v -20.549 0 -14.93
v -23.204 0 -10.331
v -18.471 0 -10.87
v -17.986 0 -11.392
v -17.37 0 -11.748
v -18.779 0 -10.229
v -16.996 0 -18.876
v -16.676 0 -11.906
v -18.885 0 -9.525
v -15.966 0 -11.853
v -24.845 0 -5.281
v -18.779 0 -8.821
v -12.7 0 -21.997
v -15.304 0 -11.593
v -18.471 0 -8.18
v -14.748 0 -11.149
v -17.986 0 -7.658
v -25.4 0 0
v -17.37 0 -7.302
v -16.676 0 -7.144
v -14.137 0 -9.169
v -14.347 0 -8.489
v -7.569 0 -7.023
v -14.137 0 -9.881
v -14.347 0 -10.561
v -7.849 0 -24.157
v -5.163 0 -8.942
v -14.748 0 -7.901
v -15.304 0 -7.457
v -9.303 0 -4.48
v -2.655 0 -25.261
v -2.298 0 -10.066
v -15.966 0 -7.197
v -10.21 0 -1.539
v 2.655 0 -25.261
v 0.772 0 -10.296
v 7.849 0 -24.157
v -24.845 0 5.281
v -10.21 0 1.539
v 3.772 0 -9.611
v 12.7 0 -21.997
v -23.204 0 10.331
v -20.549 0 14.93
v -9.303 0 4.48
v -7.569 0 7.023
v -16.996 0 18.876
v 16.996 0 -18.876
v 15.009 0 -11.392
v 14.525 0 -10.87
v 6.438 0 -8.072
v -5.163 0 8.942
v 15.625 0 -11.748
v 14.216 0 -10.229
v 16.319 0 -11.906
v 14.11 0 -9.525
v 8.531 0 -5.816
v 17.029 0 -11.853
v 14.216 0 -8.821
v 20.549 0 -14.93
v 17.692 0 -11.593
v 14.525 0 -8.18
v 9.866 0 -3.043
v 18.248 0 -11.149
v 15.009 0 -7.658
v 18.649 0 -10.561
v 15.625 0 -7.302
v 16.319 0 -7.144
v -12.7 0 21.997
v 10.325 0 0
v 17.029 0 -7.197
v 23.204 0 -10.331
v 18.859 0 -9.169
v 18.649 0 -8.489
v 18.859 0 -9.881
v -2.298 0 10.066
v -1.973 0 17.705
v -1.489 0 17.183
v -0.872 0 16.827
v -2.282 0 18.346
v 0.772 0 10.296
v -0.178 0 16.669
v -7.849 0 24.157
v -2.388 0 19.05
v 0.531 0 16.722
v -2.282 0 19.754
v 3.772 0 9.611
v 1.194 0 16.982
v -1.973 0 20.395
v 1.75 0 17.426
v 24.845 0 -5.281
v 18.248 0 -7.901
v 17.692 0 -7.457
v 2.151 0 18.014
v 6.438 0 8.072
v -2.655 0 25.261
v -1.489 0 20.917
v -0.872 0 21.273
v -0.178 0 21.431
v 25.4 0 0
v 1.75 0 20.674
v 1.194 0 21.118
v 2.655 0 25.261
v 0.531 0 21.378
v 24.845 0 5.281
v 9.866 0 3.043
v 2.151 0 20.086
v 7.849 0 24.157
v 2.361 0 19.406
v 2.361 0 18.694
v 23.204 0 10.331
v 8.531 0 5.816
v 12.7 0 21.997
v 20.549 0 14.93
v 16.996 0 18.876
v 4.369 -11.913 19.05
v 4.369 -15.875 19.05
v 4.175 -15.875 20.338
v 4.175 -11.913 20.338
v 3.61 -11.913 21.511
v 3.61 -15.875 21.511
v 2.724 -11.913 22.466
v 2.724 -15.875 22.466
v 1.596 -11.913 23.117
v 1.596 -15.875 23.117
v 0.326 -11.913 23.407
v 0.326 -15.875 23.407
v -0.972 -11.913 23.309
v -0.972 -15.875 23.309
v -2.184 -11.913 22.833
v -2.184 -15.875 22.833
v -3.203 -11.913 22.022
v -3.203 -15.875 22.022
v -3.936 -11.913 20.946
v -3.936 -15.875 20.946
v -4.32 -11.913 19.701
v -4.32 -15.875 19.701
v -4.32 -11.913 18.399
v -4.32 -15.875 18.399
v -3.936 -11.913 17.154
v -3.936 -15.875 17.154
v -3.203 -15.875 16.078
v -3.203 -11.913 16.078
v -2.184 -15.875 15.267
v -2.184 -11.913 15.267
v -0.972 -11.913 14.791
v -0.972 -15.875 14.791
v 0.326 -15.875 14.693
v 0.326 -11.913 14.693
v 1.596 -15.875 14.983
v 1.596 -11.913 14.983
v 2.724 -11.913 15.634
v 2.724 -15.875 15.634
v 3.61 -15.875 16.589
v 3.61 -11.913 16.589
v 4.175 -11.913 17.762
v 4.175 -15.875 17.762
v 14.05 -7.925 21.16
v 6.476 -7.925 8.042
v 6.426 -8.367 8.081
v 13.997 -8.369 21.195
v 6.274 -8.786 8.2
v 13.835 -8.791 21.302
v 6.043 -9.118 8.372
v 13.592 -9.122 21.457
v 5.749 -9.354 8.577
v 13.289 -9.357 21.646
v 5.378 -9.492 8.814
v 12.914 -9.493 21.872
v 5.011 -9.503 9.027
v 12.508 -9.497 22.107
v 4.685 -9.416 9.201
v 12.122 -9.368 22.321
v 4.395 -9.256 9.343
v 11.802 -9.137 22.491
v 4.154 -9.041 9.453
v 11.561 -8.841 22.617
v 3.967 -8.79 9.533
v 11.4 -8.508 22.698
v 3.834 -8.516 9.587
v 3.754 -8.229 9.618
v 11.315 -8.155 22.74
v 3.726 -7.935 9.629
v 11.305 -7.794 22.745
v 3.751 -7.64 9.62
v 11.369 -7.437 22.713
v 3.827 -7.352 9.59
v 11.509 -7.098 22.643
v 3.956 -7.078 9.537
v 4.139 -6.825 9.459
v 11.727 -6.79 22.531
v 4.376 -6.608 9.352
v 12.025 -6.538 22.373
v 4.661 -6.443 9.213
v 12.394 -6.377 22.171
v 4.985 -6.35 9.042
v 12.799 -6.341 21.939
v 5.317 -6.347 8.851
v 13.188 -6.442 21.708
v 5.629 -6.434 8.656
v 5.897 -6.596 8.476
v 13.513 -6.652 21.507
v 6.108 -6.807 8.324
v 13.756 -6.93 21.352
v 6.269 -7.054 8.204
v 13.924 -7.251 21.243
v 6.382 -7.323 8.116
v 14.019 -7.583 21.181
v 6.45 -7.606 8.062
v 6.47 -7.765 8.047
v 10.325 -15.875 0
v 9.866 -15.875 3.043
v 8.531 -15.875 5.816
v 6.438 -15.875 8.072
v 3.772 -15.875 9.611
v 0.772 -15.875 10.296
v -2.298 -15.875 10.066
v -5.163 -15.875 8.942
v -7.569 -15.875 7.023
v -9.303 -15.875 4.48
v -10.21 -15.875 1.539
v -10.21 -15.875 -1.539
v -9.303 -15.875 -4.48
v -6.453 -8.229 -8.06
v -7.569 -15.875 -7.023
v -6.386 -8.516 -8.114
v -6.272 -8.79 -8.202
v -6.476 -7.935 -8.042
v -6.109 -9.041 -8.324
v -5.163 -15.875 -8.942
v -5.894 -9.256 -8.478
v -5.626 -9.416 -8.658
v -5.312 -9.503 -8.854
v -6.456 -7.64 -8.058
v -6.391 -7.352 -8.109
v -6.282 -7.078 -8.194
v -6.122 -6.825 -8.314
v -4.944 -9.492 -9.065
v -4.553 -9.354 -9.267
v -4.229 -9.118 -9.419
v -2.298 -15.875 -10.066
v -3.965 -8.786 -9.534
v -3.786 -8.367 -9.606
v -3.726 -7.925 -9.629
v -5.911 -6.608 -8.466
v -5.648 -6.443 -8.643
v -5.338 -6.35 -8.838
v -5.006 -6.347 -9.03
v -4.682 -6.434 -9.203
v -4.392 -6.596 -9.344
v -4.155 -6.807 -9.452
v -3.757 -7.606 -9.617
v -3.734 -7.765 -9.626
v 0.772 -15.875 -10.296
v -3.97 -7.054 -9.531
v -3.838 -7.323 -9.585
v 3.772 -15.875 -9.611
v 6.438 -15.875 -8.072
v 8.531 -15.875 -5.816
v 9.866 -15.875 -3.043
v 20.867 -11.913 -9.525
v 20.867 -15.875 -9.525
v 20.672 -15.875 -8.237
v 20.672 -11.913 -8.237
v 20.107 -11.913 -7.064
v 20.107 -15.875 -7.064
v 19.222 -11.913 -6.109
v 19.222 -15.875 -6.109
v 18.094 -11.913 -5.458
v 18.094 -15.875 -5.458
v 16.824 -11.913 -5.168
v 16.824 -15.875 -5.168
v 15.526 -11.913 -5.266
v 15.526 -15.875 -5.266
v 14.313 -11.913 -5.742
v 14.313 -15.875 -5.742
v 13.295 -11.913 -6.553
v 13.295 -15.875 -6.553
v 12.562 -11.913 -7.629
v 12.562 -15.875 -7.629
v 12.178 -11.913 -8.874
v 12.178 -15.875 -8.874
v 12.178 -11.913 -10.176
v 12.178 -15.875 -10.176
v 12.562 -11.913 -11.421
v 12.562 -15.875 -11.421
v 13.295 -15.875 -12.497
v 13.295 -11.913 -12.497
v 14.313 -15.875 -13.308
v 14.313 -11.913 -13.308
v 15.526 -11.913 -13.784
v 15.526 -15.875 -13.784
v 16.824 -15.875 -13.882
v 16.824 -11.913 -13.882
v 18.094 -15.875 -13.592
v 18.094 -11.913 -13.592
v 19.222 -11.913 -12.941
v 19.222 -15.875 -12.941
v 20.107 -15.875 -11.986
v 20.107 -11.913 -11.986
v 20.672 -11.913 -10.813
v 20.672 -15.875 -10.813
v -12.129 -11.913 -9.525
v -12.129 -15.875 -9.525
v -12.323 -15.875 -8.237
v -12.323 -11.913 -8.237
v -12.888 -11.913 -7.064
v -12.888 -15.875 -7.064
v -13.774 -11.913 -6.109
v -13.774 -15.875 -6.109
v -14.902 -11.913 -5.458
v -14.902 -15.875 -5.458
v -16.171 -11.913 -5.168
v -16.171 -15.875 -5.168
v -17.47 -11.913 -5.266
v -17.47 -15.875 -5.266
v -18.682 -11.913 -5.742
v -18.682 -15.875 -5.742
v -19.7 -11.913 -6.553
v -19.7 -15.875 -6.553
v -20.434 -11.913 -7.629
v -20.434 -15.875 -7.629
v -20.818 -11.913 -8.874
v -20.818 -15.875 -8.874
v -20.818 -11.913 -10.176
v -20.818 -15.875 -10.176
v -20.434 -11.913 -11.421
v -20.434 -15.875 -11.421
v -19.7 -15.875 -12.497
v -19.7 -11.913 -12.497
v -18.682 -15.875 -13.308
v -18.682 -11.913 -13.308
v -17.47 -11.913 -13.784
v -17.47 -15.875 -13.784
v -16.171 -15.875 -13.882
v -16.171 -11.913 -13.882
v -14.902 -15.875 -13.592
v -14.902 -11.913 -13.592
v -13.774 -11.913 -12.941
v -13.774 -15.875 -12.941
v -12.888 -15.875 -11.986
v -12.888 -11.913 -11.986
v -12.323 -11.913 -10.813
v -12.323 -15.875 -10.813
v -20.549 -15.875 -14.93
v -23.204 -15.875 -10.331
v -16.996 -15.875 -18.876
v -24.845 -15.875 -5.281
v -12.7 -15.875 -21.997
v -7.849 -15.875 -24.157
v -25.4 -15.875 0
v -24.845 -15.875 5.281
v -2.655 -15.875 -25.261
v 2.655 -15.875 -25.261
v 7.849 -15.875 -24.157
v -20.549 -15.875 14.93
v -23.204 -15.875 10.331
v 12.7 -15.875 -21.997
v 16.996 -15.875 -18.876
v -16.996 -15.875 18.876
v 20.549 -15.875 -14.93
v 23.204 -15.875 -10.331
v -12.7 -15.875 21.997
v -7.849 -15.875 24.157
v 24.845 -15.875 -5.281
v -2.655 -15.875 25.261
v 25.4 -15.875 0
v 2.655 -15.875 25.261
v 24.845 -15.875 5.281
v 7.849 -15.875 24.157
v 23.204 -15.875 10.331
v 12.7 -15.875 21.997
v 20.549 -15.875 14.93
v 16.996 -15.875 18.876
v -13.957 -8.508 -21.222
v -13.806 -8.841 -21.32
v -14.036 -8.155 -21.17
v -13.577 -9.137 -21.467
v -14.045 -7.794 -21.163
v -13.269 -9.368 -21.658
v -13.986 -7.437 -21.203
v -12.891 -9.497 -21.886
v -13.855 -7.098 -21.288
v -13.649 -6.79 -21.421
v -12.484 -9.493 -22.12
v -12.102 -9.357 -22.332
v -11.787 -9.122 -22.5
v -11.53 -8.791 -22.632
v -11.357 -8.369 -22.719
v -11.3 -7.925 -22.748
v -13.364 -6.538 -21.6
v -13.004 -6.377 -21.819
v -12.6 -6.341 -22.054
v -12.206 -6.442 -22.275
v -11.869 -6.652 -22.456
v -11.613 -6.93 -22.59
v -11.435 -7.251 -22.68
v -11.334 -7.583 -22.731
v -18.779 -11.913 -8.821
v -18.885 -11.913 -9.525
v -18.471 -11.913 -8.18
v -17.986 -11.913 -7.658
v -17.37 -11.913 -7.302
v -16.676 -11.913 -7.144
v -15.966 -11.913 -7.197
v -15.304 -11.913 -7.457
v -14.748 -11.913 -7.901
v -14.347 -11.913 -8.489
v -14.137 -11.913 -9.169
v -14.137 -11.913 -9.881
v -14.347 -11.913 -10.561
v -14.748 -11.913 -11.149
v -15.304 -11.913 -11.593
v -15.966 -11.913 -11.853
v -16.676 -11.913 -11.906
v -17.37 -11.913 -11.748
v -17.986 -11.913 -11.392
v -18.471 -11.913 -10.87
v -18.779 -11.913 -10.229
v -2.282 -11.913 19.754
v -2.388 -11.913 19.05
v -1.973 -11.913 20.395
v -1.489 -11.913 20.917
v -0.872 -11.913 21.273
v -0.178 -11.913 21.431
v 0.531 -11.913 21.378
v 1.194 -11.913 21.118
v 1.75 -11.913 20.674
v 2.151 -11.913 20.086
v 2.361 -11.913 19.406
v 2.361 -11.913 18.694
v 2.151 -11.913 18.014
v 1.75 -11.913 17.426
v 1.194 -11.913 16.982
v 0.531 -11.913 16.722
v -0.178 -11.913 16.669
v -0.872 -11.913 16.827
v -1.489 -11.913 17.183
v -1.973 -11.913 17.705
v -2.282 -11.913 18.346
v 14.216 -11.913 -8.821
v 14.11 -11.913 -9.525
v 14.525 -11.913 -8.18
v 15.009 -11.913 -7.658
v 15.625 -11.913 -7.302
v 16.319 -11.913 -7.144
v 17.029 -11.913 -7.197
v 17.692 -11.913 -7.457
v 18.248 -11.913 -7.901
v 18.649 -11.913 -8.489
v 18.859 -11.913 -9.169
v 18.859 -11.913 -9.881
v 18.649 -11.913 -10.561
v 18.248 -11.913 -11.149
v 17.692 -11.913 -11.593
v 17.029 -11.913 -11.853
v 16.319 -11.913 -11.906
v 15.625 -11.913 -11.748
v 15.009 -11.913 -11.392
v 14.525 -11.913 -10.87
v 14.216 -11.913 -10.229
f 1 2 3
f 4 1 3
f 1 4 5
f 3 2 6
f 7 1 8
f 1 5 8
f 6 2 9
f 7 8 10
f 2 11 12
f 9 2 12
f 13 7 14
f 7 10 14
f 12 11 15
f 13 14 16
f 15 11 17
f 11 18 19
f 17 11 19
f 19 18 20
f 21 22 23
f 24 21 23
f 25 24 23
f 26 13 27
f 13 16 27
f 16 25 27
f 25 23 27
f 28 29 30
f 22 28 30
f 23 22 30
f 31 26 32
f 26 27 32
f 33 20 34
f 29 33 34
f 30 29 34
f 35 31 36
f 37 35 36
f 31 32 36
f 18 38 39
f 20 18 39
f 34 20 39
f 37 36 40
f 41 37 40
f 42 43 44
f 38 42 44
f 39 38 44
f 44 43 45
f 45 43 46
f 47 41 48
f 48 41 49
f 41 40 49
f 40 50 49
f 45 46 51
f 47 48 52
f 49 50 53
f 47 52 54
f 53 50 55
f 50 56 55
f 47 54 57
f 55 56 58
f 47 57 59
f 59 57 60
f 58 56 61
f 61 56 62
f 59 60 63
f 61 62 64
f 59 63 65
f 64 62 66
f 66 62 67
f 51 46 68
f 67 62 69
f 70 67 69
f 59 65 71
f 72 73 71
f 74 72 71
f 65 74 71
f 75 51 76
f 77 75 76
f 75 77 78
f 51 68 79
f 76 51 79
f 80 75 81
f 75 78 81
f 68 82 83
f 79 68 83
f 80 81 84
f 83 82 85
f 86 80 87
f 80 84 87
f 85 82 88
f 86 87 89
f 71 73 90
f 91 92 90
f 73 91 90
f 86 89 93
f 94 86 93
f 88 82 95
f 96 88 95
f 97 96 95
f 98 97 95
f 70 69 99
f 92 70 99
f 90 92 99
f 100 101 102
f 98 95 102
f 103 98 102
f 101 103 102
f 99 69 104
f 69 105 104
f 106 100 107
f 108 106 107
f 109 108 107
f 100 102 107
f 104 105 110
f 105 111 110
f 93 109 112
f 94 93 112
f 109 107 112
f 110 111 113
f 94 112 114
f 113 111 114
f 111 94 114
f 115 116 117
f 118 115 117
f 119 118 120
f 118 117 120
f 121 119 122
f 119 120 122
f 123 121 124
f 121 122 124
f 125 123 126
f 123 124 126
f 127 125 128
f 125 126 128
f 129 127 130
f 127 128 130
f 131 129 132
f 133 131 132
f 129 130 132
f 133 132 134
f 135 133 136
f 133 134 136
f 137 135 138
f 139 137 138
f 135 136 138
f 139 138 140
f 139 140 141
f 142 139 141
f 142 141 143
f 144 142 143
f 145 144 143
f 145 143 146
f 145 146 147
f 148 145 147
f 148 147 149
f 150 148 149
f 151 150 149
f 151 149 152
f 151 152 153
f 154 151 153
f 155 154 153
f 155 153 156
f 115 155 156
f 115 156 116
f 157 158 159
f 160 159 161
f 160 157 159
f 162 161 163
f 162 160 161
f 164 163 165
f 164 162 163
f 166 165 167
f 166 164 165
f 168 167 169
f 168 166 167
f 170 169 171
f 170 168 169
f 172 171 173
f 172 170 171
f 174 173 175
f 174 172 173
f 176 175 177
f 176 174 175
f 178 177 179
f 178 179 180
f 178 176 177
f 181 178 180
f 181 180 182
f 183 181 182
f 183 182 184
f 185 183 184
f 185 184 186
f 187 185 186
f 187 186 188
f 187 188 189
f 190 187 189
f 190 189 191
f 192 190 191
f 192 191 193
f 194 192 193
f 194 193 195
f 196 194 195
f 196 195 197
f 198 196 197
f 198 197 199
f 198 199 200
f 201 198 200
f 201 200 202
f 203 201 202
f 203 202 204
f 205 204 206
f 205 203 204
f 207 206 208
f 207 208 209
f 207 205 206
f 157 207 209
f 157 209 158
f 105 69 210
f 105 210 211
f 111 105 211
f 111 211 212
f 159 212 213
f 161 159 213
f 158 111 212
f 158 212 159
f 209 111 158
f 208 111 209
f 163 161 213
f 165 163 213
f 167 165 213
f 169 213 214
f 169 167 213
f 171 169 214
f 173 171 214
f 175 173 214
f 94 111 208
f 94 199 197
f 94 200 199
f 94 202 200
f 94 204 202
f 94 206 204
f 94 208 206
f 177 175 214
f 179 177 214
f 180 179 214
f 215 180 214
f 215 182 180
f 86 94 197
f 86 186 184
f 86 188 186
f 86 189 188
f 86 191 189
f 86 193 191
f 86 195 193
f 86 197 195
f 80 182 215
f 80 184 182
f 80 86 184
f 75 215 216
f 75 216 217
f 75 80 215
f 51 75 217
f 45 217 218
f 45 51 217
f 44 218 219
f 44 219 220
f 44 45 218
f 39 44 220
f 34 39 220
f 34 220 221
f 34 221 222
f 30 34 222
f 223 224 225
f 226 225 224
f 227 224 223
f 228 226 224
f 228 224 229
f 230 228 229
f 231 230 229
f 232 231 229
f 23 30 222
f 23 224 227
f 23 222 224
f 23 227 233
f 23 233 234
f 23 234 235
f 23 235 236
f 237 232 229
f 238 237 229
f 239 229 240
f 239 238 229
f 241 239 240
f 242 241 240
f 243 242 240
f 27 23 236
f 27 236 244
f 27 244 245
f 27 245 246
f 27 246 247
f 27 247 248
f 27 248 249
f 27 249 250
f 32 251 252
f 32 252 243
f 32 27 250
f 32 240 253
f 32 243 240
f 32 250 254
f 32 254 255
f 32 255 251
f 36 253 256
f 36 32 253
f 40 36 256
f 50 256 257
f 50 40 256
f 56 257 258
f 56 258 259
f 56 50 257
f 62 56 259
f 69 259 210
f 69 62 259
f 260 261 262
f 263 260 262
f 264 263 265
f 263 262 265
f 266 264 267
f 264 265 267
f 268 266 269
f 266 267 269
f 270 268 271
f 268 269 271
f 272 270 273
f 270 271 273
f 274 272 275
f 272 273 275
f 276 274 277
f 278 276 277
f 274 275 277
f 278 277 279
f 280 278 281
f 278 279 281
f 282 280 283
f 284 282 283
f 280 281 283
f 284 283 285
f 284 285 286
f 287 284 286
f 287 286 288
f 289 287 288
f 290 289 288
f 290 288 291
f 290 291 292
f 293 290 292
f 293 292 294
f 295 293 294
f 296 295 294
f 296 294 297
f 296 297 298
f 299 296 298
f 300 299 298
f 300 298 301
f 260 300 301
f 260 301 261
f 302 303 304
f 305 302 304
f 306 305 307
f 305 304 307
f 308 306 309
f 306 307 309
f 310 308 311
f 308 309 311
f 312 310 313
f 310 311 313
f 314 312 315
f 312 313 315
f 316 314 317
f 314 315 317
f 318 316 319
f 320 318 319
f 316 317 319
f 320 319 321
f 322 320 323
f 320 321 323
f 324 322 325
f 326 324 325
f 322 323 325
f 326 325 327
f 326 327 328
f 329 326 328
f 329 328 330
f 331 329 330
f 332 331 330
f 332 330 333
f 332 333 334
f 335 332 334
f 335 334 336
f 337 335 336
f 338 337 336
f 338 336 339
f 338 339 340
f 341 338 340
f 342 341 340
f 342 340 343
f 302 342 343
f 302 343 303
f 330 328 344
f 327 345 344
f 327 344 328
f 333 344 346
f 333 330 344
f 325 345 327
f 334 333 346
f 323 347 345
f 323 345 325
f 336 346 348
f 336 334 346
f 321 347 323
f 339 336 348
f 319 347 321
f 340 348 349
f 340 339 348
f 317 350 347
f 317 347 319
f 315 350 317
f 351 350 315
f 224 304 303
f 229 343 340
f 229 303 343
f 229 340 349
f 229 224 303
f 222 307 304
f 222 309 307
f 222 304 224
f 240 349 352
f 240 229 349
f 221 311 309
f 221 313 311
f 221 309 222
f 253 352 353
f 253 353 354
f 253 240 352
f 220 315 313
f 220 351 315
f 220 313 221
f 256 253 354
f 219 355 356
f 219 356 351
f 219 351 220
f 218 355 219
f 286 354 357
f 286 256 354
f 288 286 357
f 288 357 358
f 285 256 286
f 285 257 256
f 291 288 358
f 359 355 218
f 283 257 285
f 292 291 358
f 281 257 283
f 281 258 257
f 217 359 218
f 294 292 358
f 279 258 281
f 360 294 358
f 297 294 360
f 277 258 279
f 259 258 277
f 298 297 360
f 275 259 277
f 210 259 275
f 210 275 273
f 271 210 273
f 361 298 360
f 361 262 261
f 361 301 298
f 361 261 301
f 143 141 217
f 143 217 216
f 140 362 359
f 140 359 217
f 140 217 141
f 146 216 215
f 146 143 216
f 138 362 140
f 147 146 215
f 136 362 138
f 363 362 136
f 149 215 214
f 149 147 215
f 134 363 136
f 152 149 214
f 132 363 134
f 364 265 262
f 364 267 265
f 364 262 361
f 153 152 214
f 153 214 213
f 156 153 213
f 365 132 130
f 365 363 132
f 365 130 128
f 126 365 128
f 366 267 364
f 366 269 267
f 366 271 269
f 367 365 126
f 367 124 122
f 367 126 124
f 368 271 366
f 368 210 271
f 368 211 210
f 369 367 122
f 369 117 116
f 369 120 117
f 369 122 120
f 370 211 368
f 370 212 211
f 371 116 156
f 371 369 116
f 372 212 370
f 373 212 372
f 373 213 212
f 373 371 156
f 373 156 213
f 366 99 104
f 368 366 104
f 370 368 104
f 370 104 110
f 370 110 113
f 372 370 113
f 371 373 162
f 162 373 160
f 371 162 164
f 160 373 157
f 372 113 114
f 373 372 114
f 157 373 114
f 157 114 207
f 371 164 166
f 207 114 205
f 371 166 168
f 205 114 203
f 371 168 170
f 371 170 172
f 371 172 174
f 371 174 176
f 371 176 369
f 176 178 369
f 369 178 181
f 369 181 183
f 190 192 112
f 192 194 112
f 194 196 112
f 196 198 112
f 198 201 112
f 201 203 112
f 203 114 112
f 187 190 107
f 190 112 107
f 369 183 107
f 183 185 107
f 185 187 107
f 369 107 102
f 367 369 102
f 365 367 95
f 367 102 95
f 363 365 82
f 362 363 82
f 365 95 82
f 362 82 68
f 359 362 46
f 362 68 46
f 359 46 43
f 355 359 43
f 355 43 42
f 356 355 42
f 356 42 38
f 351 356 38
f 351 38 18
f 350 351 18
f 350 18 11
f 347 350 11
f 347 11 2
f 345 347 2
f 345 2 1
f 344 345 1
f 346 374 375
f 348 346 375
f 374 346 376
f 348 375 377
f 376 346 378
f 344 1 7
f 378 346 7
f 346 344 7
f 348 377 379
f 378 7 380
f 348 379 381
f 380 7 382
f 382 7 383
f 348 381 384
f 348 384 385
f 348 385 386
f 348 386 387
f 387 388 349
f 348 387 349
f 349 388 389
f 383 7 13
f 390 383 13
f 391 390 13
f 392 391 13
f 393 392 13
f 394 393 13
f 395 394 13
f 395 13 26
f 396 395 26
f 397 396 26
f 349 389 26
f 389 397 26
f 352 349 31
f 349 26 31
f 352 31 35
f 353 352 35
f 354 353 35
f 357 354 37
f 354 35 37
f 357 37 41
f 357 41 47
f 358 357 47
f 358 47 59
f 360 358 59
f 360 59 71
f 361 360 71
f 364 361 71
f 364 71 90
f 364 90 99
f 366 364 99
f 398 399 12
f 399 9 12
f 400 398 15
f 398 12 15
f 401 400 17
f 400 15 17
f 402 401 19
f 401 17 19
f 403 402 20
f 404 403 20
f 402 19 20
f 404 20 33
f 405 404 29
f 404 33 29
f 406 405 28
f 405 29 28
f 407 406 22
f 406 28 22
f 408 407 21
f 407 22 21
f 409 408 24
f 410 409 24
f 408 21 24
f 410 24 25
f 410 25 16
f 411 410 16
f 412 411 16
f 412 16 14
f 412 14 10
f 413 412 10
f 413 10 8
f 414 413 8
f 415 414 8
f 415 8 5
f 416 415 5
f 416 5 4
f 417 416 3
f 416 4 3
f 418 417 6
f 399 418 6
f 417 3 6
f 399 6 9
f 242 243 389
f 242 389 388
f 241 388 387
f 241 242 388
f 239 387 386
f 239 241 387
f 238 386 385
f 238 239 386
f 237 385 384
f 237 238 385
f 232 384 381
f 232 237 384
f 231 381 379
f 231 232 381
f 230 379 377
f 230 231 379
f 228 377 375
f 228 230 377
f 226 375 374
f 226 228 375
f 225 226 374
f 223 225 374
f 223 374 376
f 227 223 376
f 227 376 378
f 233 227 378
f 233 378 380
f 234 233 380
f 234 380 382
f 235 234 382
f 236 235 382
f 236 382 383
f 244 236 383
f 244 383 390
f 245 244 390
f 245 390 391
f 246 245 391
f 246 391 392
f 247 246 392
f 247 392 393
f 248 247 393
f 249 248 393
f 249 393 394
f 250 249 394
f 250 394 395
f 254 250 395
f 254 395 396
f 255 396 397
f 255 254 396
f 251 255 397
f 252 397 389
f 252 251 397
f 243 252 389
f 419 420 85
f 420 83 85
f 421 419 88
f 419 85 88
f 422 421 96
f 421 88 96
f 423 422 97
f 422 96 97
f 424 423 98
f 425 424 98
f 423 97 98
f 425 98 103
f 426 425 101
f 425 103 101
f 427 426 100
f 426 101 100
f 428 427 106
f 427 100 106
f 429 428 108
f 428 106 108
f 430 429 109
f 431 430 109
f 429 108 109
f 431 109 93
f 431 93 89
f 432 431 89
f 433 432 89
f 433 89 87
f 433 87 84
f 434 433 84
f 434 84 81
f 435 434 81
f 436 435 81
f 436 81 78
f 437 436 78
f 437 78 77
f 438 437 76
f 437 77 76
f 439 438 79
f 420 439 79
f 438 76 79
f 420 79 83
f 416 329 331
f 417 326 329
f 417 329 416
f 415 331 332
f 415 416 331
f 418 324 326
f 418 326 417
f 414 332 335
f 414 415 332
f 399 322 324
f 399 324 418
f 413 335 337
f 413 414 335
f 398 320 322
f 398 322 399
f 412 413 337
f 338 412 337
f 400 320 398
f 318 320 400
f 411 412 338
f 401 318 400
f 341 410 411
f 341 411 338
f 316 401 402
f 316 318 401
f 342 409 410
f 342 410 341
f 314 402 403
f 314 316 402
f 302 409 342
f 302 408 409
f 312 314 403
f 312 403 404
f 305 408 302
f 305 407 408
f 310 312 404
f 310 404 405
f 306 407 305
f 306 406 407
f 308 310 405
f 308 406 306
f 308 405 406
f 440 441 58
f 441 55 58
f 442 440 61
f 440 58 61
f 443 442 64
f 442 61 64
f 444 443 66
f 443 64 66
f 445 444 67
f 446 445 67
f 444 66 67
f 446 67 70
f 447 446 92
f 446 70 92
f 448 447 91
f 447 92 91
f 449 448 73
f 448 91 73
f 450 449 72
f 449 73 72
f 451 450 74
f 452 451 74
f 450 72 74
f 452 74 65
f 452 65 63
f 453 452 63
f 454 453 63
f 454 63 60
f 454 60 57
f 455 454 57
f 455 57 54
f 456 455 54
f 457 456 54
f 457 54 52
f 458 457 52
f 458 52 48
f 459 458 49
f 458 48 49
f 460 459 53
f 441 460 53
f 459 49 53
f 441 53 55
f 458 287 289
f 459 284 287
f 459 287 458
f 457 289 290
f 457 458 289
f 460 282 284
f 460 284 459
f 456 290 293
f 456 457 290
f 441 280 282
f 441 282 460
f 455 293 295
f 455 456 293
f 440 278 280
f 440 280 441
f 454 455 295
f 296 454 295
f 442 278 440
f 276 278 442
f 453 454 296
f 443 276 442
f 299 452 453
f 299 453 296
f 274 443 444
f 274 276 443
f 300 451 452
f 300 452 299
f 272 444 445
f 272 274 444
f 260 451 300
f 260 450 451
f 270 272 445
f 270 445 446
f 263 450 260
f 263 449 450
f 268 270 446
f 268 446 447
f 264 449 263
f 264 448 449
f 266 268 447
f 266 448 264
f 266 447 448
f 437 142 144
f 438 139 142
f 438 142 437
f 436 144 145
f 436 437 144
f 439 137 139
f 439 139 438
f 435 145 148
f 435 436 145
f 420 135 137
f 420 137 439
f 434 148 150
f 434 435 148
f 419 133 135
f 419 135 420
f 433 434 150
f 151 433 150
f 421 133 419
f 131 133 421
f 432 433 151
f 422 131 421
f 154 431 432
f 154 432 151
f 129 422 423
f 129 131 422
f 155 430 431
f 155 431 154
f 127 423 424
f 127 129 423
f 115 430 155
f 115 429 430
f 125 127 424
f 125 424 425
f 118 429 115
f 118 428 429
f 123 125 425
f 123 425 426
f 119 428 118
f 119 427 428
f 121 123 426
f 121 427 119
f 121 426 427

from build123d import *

# Parameters (mm, degrees)
F0_R           = 25.4
F0_R_2         = 10.3251
F1_DEPTH       = 15.875
F3_D           = 4.7752
F3_CBORE_D     = 8.7376
F3_CBORE_DEPTH = 3.9624
F6_R           = 1.5875
F7_DEPTH       = 9.2980452561
F8_R           = 1.5875
F9_DEPTH       = 60.0980452561


with BuildPart() as f1:
    # F0 (on Front) → F1 (new body)
    with BuildSketch(Plane.XZ):
        Circle(F0_R)
        Circle(F0_R_2, mode=Mode.SUBTRACT)
    extrude(amount=F1_DEPTH)

    # F3 (through all)
    with Locations(Plane.XZ.offset(15.875)):
        with Locations((0, 19.05), (-16.4977839421, -9.525), (16.4977839421, -9.525)):
            CounterBoreHole(F3_D / 2, F3_CBORE_D / 2, F3_CBORE_DEPTH)

    # F6 (on face) → F7 (cut, through all)
    with BuildSketch(Plane(origin=(12.7, 0, 21.9970452561), x_dir=(0.8660254038, 0, -0.5), z_dir=(-0.5, 0, -0.8660254038))):
        with Locations((0.8242388722, 7.9502)):
            Circle(F6_R)
    extrude(amount=-F7_DEPTH, mode=Mode.SUBTRACT)

    # F8 (on face) → F9 (cut, through all)
    with BuildSketch(Plane(origin=(12.7, 0, 21.9970452561), x_dir=(0.8660254038, 0, -0.5), z_dir=(-0.5, 0, -0.8660254038))):
        with Locations((0, 7.9248)):
            Circle(F8_R)
    extrude(amount=F9_DEPTH, mode=Mode.SUBTRACT)


solid = f1.part
